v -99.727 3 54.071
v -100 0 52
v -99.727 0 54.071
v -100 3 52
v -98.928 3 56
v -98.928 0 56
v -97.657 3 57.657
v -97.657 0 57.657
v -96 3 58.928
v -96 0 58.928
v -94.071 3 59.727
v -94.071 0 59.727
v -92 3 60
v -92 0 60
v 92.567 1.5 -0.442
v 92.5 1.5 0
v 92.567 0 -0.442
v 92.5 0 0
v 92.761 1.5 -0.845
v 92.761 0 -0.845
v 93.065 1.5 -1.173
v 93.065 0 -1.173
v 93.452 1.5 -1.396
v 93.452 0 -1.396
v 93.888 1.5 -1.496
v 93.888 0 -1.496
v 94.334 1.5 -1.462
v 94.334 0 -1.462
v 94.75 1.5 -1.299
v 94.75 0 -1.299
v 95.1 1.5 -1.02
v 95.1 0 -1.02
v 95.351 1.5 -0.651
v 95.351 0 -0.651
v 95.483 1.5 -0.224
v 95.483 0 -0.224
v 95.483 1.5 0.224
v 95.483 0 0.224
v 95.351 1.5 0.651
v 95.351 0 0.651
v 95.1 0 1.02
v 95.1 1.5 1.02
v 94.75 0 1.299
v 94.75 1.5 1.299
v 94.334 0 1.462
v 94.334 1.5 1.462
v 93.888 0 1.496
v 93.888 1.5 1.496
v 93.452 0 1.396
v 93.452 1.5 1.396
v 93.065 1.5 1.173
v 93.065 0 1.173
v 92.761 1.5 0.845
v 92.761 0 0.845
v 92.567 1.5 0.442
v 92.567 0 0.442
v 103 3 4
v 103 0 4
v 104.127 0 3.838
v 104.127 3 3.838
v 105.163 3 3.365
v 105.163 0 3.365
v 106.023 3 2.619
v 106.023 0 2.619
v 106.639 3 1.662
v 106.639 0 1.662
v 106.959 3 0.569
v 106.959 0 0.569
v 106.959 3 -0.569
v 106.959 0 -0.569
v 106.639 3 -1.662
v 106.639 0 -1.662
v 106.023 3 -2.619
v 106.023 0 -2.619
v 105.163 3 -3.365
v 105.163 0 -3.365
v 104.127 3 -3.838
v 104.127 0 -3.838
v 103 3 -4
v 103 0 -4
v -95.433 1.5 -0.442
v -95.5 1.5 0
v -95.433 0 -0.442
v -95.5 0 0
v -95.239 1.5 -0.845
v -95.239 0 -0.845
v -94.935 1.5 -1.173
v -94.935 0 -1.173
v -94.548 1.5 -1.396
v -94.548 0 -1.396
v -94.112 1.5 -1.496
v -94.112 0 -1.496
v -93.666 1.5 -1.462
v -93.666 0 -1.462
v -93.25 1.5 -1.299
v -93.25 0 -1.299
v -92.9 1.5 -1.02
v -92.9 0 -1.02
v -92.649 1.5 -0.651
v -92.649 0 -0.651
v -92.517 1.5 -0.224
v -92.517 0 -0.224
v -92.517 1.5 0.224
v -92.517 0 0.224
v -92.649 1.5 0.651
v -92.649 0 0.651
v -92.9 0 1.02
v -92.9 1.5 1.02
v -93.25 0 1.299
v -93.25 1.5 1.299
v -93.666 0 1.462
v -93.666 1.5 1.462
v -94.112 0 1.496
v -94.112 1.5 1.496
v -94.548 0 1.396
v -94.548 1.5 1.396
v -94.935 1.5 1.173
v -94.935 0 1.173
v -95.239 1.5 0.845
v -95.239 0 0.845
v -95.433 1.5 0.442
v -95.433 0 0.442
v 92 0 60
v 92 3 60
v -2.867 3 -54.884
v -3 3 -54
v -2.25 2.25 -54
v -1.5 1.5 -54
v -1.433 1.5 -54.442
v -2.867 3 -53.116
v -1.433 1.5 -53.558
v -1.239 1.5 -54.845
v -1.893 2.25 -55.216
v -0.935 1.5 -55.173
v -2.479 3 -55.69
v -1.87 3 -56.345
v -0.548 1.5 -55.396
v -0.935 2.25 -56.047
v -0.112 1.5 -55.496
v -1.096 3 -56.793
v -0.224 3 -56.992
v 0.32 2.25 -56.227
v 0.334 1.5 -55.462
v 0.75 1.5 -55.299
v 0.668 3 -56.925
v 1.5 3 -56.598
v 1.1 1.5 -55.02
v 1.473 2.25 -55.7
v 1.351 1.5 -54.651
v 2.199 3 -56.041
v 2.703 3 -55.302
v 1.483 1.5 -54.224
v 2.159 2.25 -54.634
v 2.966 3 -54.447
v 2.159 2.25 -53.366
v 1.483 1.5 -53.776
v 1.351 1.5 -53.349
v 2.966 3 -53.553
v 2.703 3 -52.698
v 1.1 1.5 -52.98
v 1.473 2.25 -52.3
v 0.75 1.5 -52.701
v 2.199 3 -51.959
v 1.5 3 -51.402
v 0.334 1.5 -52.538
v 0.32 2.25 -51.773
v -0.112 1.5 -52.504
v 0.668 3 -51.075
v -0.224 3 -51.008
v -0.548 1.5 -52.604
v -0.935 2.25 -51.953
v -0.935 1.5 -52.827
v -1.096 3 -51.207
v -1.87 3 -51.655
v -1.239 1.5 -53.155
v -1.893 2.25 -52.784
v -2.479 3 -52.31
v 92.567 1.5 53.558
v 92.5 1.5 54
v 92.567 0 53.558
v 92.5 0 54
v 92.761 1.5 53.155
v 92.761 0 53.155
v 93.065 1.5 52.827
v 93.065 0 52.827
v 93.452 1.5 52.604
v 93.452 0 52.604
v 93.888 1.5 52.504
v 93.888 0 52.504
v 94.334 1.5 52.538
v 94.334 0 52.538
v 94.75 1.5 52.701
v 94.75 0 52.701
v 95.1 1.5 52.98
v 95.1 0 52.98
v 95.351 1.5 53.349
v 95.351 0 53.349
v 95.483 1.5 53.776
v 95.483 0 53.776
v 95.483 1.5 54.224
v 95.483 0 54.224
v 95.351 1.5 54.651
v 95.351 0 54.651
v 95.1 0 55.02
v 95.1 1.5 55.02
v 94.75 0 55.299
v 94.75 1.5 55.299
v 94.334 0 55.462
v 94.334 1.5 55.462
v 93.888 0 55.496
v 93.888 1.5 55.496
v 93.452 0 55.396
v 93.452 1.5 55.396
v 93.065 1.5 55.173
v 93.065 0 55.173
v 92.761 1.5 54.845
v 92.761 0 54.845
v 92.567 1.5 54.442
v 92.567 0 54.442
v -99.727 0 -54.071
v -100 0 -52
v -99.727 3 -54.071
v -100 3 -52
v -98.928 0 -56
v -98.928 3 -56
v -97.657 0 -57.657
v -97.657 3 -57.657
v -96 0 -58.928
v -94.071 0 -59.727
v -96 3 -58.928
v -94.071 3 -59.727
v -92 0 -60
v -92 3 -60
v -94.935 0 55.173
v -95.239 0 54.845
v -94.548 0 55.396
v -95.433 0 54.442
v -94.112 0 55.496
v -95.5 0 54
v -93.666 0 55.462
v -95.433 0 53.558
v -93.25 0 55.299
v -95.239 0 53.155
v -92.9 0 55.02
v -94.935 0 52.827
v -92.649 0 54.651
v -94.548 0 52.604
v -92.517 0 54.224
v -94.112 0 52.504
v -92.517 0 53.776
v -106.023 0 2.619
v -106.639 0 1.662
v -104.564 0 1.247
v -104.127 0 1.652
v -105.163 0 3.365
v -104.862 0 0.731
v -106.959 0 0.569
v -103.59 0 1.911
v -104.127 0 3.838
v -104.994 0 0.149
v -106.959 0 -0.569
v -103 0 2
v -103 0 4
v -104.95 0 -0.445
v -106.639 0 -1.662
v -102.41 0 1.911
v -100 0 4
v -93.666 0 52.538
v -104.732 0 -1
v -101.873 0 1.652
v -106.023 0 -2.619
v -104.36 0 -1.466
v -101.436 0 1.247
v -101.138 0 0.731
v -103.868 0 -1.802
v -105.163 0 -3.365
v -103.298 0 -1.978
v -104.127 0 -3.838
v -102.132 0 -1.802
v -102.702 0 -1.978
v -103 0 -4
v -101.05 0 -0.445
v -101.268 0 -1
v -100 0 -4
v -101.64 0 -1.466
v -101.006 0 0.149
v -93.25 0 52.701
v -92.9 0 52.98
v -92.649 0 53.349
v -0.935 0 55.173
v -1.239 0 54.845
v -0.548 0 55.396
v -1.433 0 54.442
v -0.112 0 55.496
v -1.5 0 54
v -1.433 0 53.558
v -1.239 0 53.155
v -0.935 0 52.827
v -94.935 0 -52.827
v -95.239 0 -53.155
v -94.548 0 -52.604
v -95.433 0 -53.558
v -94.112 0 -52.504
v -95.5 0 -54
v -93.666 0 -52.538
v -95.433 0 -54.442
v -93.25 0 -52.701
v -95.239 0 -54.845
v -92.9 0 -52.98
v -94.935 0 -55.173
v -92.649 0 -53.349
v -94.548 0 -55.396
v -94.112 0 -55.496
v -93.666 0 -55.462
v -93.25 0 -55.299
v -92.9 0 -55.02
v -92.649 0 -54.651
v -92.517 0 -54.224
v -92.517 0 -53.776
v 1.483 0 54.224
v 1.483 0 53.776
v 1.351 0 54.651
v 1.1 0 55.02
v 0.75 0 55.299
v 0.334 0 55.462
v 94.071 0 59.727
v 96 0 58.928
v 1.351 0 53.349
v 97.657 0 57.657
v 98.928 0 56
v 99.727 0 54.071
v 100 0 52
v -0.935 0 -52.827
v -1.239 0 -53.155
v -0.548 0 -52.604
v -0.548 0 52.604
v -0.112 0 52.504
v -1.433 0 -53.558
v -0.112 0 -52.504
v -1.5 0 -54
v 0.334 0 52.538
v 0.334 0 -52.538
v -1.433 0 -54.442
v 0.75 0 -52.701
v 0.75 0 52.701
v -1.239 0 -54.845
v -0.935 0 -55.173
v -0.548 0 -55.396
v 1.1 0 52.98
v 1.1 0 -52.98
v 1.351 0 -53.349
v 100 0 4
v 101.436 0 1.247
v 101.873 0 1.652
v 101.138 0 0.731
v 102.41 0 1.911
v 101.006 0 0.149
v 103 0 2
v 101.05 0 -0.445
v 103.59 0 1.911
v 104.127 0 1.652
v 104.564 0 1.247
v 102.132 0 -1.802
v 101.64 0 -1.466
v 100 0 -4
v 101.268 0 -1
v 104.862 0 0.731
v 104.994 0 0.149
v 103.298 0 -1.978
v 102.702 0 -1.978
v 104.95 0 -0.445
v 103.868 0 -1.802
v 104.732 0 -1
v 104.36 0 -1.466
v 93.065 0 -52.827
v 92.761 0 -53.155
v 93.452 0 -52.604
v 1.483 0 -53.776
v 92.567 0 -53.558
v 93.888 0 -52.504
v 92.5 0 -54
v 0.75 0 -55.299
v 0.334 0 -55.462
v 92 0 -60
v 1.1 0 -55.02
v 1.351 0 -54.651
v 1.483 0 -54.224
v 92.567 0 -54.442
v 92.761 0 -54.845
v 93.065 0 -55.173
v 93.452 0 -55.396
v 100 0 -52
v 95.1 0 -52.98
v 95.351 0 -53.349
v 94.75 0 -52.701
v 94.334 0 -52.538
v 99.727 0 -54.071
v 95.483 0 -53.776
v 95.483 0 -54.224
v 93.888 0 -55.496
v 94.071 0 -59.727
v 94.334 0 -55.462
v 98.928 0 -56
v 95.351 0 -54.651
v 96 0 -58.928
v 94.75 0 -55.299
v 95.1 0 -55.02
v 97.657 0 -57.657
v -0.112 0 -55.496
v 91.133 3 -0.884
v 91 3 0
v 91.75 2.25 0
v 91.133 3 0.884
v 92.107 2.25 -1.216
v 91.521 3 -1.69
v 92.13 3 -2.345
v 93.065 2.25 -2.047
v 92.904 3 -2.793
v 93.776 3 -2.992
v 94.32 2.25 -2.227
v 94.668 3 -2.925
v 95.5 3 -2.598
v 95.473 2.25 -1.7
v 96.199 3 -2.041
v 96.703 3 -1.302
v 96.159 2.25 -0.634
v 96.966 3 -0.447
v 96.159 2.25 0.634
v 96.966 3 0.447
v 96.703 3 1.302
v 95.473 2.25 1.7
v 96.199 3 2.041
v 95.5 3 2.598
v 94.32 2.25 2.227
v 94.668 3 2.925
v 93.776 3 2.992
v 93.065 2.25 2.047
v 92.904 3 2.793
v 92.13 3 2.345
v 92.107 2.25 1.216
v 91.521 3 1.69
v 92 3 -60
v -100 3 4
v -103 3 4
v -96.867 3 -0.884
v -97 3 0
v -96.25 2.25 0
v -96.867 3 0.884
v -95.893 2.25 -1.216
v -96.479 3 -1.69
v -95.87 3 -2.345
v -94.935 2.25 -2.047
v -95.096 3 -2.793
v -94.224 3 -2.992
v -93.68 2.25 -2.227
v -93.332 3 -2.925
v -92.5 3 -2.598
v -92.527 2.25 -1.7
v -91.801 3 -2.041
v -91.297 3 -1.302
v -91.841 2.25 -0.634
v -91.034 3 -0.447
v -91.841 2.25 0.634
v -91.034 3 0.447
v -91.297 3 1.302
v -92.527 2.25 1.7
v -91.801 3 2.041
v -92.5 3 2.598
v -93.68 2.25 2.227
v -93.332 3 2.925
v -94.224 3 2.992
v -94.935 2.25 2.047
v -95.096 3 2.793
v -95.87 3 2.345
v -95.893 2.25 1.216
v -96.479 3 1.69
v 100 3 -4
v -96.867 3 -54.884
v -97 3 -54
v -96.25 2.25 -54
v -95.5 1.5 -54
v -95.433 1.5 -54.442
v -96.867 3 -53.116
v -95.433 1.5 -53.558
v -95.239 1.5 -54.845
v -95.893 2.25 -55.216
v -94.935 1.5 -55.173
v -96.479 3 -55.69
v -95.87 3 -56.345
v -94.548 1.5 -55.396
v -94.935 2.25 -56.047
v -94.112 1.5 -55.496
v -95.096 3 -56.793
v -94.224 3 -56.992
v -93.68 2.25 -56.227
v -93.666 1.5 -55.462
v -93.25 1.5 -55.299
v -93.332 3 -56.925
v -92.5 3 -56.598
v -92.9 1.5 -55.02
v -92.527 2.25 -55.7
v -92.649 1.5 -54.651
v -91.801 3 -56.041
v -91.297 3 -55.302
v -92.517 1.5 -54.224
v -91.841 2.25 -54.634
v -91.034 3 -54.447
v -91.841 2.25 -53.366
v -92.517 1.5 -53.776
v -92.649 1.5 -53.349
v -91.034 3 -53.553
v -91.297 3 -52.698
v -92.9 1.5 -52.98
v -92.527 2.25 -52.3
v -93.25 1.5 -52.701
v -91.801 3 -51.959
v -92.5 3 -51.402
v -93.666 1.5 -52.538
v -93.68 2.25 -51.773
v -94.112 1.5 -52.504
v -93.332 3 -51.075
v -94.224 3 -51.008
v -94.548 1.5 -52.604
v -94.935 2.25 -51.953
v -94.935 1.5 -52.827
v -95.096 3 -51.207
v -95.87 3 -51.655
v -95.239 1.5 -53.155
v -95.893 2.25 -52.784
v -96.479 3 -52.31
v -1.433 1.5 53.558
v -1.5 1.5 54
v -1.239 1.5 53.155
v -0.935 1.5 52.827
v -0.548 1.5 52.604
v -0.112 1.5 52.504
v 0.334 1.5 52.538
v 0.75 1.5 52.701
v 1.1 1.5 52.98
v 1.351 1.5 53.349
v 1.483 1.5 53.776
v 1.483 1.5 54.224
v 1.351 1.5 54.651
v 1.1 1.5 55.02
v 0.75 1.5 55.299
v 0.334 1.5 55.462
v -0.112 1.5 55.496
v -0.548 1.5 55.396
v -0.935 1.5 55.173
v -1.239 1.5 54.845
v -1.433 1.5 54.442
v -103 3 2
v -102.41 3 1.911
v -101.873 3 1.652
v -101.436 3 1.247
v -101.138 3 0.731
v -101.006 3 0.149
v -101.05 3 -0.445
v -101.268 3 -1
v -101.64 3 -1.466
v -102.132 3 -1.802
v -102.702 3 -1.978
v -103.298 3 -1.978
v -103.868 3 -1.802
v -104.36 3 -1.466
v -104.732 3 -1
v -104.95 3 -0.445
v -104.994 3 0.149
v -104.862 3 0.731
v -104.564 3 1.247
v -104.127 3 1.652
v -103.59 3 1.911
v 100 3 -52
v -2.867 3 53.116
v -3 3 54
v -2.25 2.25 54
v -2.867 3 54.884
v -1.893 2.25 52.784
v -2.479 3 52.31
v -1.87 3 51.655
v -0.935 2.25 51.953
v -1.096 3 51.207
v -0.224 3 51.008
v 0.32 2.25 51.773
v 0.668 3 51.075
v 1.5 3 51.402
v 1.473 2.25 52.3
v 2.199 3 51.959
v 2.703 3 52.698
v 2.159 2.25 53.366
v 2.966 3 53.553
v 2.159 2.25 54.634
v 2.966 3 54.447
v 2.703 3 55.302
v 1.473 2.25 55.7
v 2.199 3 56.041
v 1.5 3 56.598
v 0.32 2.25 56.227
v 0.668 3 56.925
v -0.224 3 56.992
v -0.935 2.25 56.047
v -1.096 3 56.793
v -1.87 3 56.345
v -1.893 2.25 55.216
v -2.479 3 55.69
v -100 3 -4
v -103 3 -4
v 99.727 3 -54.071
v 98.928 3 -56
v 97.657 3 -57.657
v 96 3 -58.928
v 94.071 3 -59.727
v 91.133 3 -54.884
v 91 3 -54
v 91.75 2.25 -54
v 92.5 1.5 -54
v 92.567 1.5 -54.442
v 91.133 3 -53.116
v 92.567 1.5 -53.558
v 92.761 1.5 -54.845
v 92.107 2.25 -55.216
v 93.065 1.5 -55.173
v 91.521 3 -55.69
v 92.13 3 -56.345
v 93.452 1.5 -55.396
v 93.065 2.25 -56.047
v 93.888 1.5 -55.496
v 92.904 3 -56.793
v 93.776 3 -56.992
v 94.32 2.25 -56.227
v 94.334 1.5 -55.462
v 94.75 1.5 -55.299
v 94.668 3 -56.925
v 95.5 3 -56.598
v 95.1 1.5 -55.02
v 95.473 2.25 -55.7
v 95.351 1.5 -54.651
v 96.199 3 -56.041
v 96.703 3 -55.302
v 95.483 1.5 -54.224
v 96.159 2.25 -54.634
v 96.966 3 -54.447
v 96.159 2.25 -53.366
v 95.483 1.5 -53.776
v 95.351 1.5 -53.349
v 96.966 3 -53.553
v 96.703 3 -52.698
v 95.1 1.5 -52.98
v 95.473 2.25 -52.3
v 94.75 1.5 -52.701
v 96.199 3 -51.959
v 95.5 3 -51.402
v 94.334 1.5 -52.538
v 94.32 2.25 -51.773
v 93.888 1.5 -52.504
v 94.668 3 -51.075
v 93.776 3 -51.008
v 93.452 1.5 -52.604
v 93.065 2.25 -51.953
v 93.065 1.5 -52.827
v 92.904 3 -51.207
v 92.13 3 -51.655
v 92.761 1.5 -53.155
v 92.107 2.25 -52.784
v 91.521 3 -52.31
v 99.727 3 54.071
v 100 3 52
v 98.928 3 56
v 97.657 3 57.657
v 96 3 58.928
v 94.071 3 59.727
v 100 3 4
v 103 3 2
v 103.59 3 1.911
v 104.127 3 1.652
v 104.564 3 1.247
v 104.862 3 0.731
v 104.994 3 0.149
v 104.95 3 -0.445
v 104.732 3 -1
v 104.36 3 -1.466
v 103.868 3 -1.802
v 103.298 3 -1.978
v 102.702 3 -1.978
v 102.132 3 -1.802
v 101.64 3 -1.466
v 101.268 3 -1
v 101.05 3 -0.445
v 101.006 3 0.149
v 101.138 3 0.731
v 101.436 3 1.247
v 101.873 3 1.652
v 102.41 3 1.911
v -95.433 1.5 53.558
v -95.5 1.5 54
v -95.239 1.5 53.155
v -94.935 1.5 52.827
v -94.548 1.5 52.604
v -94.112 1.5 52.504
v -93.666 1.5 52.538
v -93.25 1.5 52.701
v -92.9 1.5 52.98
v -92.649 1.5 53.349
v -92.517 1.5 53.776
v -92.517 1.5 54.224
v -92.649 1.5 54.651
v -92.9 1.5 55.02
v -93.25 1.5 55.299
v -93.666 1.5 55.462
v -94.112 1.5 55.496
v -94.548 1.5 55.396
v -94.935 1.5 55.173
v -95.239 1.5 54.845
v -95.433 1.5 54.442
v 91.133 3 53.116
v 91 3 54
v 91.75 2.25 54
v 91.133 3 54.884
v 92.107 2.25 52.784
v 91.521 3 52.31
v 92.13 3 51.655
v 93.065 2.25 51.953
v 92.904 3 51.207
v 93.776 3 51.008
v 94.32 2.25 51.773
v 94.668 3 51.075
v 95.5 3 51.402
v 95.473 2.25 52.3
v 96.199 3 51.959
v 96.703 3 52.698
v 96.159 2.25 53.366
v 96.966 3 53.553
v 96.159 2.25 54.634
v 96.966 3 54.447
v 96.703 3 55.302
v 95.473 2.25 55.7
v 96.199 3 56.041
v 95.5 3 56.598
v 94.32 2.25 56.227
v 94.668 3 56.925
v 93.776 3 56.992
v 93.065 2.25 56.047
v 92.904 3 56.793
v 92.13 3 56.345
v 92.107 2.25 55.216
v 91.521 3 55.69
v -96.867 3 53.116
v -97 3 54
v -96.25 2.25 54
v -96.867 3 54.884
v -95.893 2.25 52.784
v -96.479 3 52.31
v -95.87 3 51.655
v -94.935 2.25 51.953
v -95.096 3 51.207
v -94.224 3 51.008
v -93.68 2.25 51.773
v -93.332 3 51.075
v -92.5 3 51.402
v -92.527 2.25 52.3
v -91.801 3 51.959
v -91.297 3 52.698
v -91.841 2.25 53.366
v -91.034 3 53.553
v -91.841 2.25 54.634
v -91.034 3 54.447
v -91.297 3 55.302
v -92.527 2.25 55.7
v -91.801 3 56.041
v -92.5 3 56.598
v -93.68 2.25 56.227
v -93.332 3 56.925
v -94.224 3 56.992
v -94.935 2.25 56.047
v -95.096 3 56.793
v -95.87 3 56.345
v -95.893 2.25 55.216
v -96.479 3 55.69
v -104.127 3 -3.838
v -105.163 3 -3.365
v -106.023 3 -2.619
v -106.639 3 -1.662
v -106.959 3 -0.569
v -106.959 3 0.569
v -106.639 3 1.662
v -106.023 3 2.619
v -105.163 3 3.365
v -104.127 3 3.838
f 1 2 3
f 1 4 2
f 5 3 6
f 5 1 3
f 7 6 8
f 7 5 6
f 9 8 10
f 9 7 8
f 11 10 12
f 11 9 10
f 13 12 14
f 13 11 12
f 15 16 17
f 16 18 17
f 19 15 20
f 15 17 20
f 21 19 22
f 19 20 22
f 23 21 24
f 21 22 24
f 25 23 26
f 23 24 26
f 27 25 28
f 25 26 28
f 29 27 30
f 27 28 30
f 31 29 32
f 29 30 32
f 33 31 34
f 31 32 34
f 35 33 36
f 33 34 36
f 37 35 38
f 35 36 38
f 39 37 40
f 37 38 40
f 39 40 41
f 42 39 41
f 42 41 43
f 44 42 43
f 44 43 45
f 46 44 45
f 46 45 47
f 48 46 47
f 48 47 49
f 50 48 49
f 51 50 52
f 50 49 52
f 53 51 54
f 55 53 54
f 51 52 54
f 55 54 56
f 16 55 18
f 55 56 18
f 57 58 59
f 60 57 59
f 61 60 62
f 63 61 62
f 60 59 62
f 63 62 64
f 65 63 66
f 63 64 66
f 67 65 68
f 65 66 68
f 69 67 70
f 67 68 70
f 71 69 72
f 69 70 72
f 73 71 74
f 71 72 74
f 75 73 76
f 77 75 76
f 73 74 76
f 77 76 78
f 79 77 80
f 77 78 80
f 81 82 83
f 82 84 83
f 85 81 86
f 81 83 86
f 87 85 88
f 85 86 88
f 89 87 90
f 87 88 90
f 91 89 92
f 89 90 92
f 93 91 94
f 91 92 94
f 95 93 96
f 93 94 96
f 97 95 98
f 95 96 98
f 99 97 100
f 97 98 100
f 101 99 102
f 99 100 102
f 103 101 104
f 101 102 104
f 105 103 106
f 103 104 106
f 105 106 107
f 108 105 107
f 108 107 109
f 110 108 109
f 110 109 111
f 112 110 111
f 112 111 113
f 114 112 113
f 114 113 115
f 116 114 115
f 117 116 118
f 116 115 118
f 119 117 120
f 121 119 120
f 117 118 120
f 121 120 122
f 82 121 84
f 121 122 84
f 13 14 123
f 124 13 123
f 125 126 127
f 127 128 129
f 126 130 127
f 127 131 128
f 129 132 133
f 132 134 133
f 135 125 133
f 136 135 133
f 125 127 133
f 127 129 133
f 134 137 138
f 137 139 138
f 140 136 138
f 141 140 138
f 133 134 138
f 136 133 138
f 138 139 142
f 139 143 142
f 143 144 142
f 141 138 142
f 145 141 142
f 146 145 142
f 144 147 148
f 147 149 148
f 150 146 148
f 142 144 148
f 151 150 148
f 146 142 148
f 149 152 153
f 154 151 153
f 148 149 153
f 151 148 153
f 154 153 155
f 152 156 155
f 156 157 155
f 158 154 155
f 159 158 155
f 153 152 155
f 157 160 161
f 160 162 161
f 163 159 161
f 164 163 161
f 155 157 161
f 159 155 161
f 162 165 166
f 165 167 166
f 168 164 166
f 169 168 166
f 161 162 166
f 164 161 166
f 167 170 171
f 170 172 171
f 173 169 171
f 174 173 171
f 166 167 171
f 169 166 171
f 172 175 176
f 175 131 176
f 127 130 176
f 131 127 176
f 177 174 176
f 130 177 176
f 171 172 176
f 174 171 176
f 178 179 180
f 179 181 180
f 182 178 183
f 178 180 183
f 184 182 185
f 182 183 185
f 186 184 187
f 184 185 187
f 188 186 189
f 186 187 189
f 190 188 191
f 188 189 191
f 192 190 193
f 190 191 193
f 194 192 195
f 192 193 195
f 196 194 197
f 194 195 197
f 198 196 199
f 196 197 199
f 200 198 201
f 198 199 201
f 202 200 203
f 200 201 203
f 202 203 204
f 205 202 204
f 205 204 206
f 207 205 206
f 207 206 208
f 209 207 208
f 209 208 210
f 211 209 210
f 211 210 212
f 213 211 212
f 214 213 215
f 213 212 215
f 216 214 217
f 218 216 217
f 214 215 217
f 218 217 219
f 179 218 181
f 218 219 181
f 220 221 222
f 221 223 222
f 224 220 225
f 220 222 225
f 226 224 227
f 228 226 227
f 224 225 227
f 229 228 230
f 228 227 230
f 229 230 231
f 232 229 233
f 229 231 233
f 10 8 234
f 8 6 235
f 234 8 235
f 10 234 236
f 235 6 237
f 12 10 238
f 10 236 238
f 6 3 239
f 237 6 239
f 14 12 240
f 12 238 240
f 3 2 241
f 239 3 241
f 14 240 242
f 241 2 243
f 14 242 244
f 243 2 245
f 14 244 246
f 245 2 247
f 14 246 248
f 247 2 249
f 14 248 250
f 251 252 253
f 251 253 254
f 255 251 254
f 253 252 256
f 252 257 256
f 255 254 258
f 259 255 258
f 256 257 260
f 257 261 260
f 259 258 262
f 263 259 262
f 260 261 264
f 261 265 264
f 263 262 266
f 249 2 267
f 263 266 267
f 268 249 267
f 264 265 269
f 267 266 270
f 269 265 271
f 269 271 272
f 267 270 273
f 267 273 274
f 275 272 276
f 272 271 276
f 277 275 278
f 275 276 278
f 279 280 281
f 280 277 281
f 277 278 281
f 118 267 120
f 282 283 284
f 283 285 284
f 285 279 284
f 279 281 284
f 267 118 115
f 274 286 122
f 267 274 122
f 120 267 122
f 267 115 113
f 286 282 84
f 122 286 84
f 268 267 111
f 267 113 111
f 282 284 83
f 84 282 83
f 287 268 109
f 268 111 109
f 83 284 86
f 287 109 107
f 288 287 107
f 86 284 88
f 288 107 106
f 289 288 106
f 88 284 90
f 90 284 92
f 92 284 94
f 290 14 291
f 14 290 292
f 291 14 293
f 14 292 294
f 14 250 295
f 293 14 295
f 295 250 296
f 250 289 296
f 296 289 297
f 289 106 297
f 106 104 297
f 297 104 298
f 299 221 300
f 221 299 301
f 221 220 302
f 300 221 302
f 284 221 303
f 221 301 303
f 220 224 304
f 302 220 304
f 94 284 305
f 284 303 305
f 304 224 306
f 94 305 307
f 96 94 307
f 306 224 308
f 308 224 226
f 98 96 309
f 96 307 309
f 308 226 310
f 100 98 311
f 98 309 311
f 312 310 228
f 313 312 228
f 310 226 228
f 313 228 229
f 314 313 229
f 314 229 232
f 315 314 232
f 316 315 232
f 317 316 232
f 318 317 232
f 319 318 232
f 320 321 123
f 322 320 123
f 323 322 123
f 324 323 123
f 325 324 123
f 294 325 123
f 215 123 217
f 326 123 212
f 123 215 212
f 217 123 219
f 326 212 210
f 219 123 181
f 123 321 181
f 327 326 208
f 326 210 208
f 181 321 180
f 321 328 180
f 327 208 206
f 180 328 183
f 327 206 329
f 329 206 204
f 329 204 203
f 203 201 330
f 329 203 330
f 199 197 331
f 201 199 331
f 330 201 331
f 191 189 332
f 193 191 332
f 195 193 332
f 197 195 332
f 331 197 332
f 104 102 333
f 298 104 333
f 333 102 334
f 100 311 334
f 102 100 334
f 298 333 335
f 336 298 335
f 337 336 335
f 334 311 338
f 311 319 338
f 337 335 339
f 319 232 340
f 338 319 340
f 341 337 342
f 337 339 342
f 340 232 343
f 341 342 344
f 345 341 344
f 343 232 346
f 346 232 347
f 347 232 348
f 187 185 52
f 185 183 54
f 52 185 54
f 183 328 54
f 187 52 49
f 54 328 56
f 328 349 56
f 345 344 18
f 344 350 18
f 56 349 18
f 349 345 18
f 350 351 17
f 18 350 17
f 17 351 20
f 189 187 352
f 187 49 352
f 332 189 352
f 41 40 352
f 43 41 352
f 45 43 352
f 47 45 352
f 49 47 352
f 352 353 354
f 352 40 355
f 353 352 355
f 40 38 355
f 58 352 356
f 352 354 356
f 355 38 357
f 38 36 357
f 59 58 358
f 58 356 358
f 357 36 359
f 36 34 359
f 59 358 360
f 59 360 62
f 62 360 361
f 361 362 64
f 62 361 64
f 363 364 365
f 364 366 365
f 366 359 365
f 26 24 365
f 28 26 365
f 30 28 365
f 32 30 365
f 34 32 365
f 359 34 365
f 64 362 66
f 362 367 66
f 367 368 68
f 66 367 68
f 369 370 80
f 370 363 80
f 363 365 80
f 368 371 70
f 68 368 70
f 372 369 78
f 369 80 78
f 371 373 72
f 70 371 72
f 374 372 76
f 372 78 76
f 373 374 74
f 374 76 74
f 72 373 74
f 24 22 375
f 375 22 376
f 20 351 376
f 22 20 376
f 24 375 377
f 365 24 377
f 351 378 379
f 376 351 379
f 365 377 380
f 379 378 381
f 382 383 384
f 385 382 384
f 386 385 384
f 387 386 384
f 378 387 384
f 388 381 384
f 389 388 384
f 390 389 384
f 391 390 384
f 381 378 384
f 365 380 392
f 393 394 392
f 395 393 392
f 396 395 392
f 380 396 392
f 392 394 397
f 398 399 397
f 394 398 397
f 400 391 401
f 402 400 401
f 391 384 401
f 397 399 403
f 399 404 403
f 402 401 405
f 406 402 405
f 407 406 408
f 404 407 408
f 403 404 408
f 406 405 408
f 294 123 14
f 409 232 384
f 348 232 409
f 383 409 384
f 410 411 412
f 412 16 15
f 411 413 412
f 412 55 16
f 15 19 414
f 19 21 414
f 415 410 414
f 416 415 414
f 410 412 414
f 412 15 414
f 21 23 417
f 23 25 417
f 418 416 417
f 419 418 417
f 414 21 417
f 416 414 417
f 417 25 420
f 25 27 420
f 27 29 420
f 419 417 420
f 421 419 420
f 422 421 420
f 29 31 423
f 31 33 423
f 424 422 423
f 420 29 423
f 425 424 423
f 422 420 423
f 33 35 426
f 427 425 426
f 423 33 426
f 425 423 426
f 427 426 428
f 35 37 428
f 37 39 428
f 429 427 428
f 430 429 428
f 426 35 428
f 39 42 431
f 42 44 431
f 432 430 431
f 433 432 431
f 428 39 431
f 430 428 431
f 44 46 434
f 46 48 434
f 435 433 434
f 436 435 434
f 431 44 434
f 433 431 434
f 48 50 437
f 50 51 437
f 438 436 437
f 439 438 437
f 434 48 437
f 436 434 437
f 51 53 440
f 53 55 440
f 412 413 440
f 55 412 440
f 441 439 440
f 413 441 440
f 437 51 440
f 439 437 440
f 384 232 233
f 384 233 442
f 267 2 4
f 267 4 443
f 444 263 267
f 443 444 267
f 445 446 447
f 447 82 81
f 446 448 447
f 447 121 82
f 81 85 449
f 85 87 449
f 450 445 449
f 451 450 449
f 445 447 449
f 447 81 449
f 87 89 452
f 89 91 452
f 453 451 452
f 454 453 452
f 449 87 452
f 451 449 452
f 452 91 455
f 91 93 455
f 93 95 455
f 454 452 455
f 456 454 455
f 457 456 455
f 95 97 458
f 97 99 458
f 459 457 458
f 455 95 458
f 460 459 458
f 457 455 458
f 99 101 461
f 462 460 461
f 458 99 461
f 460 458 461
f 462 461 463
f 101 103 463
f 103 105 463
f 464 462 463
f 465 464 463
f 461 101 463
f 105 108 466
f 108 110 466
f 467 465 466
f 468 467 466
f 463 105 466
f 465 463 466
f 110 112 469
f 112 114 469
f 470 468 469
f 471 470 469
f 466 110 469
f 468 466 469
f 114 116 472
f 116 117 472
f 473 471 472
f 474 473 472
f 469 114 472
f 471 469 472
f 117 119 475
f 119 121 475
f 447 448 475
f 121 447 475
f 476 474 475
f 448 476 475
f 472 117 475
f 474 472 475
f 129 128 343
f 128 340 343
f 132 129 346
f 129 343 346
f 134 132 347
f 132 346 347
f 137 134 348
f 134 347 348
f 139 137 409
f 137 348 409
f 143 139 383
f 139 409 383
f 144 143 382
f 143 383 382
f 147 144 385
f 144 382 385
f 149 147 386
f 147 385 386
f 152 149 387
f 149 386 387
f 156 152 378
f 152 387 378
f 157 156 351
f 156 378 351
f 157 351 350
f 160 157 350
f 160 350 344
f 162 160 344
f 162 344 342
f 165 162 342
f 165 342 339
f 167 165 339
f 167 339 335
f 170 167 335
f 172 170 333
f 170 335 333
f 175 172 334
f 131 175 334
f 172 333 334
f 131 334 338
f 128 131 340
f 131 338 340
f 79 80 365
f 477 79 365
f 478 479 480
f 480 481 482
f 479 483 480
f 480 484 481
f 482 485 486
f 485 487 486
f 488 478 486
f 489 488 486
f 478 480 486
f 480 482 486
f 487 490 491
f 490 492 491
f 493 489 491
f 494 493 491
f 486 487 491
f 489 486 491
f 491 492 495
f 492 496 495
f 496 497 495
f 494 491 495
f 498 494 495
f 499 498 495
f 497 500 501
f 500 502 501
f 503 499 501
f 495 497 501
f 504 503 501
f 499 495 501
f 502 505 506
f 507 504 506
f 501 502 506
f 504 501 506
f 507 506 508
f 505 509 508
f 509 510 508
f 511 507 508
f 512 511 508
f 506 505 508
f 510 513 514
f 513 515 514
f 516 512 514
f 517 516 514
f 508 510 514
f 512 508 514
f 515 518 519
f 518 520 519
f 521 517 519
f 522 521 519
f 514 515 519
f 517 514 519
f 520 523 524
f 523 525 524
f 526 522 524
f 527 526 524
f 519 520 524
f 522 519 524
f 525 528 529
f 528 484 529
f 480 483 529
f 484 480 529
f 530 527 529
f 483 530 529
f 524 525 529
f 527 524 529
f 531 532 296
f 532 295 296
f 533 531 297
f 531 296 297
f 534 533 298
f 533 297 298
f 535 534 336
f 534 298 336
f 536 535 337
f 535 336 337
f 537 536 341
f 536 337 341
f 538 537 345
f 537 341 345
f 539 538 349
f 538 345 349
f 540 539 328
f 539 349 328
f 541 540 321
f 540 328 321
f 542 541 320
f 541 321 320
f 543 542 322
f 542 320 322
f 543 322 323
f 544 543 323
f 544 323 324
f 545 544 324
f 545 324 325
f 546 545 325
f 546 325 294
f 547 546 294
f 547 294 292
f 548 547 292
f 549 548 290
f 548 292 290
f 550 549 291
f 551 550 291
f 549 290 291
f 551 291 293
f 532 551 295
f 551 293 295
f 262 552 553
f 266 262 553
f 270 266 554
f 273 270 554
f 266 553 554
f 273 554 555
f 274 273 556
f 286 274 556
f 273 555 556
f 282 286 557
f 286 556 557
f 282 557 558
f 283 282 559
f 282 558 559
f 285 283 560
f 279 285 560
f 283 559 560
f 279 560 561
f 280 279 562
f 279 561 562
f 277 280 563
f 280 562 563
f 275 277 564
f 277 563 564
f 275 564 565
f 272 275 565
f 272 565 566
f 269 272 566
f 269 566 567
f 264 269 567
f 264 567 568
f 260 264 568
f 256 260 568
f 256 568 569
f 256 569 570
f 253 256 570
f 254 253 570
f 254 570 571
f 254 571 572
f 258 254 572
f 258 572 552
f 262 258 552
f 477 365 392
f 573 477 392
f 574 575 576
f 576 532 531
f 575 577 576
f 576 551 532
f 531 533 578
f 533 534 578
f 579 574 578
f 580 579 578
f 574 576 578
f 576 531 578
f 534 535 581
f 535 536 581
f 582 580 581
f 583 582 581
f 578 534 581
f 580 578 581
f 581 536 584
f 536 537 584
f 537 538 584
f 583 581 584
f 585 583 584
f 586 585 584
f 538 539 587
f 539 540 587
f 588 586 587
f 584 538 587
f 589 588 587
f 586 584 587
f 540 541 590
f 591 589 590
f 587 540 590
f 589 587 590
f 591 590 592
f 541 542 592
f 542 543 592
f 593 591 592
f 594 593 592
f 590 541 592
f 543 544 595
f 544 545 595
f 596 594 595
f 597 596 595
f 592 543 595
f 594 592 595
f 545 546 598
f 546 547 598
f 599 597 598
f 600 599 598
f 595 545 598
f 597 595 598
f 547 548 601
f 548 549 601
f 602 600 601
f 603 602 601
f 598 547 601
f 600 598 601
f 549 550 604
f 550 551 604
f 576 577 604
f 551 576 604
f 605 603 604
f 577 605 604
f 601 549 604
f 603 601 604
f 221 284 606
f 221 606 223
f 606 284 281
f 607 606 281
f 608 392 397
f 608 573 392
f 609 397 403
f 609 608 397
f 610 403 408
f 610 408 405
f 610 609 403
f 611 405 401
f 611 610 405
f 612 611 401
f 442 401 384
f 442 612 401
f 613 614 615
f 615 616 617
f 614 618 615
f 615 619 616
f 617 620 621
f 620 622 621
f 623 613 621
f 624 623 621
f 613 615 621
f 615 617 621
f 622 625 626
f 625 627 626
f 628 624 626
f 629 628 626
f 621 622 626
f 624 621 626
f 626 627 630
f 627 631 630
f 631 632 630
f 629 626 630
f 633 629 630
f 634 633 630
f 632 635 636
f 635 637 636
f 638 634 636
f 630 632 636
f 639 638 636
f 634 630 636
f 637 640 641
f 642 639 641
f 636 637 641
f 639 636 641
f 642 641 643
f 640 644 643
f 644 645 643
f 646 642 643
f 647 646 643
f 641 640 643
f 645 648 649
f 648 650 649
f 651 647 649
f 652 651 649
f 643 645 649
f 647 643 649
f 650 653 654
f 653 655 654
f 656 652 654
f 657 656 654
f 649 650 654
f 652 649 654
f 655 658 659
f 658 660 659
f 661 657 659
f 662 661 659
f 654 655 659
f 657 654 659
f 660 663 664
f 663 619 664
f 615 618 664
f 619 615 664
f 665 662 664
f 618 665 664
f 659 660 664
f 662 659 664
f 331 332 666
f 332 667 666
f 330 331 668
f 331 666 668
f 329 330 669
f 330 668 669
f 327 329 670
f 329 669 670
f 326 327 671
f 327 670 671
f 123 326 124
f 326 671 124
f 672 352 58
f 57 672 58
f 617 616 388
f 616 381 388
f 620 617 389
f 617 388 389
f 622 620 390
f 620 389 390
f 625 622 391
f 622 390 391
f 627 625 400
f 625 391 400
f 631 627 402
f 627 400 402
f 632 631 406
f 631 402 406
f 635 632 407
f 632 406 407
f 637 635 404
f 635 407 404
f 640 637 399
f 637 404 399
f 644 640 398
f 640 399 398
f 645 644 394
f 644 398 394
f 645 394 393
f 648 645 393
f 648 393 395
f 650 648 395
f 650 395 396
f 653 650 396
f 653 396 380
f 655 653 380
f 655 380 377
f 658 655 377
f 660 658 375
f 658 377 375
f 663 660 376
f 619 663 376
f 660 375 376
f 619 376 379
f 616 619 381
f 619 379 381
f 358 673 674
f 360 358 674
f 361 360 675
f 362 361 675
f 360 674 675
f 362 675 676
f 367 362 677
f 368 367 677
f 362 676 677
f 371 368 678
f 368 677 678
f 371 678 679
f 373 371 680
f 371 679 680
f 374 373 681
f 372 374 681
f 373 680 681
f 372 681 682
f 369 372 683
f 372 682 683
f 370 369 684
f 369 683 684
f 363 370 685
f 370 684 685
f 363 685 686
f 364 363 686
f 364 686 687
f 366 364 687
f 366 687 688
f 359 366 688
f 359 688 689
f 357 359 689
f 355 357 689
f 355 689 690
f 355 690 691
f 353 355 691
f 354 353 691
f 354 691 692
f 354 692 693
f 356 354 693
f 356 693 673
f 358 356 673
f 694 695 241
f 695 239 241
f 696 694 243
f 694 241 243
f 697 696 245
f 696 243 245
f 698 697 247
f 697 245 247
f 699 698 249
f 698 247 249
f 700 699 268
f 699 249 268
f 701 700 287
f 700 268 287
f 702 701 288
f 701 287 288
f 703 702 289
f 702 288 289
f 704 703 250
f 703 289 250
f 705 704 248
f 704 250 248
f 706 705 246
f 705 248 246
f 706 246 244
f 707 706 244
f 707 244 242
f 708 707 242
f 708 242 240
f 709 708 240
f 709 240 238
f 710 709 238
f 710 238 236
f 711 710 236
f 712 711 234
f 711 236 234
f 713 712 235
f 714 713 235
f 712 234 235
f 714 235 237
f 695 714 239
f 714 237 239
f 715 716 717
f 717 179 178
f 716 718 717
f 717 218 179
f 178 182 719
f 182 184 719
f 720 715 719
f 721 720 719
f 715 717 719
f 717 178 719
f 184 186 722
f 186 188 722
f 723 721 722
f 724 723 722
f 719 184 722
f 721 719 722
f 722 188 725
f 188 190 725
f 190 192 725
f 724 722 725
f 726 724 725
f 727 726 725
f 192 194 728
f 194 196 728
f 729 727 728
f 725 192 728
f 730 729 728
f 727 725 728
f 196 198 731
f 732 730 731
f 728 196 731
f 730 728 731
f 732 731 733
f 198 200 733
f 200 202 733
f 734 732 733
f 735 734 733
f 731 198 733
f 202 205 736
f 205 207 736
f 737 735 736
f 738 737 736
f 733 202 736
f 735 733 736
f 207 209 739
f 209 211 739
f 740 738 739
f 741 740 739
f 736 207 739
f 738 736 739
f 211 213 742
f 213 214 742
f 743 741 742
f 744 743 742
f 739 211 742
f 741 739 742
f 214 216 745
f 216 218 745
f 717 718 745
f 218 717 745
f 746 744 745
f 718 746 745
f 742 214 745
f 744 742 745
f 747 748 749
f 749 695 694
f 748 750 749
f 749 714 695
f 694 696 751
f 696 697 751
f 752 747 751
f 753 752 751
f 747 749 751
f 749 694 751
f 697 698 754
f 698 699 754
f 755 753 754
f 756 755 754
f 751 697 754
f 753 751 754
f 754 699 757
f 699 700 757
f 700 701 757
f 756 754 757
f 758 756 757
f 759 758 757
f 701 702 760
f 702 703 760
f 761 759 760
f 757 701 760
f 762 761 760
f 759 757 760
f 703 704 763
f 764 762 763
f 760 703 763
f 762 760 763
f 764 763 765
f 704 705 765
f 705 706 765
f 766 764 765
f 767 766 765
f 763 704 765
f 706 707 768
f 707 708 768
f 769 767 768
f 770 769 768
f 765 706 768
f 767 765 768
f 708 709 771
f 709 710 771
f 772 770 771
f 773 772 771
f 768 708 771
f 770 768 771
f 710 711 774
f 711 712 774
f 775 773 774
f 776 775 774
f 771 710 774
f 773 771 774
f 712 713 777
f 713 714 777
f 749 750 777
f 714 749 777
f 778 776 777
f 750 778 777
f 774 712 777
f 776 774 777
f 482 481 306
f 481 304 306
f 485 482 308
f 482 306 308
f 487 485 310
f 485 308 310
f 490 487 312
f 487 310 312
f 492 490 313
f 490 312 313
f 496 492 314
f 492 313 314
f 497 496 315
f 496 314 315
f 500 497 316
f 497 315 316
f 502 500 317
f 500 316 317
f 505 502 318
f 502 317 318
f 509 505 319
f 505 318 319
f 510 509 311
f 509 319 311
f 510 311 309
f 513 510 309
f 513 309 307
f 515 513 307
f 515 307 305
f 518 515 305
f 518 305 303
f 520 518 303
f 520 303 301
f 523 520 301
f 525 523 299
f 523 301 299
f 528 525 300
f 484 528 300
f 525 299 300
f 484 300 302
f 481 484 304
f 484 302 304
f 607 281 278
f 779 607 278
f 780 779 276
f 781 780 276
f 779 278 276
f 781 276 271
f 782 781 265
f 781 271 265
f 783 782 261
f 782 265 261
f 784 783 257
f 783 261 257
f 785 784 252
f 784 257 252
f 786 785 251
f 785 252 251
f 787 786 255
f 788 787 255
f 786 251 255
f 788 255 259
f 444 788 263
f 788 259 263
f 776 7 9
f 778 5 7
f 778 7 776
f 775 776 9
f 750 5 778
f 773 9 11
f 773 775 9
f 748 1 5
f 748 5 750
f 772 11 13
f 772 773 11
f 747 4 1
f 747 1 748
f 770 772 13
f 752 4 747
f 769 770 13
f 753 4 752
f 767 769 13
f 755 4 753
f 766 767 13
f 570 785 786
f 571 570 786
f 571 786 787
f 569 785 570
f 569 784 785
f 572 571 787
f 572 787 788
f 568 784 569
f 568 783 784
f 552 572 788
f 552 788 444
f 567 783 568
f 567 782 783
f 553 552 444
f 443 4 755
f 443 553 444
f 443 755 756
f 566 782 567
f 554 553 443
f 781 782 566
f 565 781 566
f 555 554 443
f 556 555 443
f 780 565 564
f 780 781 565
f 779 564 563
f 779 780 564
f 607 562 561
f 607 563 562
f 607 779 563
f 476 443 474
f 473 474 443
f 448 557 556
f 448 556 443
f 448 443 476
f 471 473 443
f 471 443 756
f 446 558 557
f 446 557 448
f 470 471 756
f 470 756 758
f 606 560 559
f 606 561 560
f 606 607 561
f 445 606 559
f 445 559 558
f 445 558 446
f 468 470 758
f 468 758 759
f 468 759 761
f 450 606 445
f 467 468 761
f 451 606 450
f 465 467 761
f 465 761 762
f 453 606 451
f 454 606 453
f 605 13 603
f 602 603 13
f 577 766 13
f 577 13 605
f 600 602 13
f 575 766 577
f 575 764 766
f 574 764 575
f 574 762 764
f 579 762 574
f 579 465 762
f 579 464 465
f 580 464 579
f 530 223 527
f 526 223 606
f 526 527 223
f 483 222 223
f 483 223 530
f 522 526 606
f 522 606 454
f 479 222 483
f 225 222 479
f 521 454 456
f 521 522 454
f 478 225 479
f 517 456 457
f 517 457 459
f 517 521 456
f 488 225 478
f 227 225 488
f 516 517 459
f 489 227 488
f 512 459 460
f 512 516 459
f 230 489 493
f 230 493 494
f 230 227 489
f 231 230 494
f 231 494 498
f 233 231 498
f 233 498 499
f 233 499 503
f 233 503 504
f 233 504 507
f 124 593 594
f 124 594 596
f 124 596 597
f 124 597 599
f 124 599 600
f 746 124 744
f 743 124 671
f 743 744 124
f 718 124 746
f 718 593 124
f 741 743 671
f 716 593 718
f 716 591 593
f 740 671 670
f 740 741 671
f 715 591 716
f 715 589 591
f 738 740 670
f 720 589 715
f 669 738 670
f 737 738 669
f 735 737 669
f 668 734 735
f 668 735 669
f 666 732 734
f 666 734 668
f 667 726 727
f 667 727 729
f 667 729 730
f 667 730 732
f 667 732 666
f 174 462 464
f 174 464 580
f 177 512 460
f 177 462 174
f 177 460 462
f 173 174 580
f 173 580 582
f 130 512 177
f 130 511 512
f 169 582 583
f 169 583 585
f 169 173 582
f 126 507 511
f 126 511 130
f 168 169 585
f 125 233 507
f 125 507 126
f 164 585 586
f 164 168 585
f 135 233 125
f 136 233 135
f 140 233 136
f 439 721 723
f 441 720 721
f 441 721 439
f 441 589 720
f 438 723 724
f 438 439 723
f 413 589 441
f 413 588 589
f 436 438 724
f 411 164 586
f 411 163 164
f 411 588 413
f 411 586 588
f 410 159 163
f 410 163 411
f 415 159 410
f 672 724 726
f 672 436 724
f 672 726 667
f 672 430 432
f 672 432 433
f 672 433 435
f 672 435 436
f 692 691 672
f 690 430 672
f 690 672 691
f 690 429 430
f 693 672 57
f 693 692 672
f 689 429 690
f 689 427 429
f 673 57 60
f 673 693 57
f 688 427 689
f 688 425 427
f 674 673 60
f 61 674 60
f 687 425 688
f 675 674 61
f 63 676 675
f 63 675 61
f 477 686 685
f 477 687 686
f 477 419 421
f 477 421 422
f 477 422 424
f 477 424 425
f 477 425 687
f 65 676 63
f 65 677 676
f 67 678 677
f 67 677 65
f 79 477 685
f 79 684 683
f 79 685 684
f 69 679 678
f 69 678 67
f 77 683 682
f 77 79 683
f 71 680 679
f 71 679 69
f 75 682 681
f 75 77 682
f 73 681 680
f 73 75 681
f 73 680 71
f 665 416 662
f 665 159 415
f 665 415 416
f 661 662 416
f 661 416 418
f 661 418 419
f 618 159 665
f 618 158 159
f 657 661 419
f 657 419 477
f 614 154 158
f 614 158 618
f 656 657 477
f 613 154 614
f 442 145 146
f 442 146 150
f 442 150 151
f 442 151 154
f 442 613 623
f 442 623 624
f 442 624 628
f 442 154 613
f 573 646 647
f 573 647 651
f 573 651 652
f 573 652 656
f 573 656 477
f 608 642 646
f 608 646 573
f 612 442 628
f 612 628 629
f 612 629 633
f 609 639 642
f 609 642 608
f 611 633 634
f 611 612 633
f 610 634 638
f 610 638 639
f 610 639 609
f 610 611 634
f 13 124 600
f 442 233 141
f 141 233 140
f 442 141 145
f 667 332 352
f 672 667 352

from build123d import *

# Parameters (mm, degrees)
SKETCH1_W                                       = 200
SKETCH1_H                                       = 120
BOSS_EXTRUDE1_DEPTH                             = 3
CSK_FOR_M3_FLAT_HEAD_MACHINE_SCREW1_D           = 3
CSK_FOR_M3_FLAT_HEAD_MACHINE_SCREW1_CSINK_D     = 6
CSK_FOR_M3_FLAT_HEAD_MACHINE_SCREW1_CSINK_ANGLE = 90
FILLET1_R                                       = 8
BOSS_EXTRUDE2_DEPTH                             = 3
SKETCH9_R                                       = 2
CUT_EXTRUDE1_DEPTH                              = 4


with BuildPart() as part:
    # Sketch1 → Boss-Extrude1 (new body)
    with BuildSketch(Plane(origin=(0, 0, 0), x_dir=(1, 0, 0), z_dir=(0, 1, 0))):
        Rectangle(SKETCH1_W, SKETCH1_H)
    extrude(amount=BOSS_EXTRUDE1_DEPTH)

    # CSK for M3 Flat Head Machine Screw1 (through all)
    with Locations(Plane(origin=(0, 3, 0), x_dir=(1, 0, 0), z_dir=(0, 1, 0))):
        with Locations((-94, 54), (0, 54), (94, 54), (94, 0), (94, -54), (0, -54), (-94, -54), (-94, 0)):
            CounterSinkHole(CSK_FOR_M3_FLAT_HEAD_MACHINE_SCREW1_D / 2, CSK_FOR_M3_FLAT_HEAD_MACHINE_SCREW1_CSINK_D / 2, counter_sink_angle=CSK_FOR_M3_FLAT_HEAD_MACHINE_SCREW1_CSINK_ANGLE)

    # Fillet1
    fillet1_edges = [part.edges().sort_by_distance(p)[0] for p in [
        (100, 1.5, 60),
        (-100, 1.5, 60),
        (-100, 1.5, -60),
        (100, 1.5, -60),
    ]]
    fillet(fillet1_edges, radius=FILLET1_R)

    # Sketch7 → Boss-Extrude2 (add)
    with BuildSketch(Plane.XZ):
        with BuildLine():
            Line((100, 4), (103, 4))
            ThreePointArc((103, 4), (107, 0), (103, -4))
            Line((103, -4), (100, -4))
            Line((100, -4), (100, 4))
        make_face()
        with BuildLine():
            Line((-100, -4), (-103, -4))
            ThreePointArc((-103, -4), (-107, 0), (-103, 4))
            Line((-103, 4), (-100, 4))
            Line((-100, 4), (-100, -4))
        make_face()
    extrude(amount=-BOSS_EXTRUDE2_DEPTH)

    # Sketch9 → Cut-Extrude1 (cut)
    with BuildSketch(Plane(origin=(0, 3, 0), x_dir=(1, 0, 0), z_dir=(0, 1, 0))):
        with Locations(Location((-103, 0, 0), (0, 0, 270))):
            Circle(SKETCH9_R)
        with Locations(Location((103, 0, 0), (0, 0, 270))):
            Circle(SKETCH9_R)
    extrude(amount=-CUT_EXTRUDE1_DEPTH, mode=Mode.SUBTRACT)


solid = part.part
